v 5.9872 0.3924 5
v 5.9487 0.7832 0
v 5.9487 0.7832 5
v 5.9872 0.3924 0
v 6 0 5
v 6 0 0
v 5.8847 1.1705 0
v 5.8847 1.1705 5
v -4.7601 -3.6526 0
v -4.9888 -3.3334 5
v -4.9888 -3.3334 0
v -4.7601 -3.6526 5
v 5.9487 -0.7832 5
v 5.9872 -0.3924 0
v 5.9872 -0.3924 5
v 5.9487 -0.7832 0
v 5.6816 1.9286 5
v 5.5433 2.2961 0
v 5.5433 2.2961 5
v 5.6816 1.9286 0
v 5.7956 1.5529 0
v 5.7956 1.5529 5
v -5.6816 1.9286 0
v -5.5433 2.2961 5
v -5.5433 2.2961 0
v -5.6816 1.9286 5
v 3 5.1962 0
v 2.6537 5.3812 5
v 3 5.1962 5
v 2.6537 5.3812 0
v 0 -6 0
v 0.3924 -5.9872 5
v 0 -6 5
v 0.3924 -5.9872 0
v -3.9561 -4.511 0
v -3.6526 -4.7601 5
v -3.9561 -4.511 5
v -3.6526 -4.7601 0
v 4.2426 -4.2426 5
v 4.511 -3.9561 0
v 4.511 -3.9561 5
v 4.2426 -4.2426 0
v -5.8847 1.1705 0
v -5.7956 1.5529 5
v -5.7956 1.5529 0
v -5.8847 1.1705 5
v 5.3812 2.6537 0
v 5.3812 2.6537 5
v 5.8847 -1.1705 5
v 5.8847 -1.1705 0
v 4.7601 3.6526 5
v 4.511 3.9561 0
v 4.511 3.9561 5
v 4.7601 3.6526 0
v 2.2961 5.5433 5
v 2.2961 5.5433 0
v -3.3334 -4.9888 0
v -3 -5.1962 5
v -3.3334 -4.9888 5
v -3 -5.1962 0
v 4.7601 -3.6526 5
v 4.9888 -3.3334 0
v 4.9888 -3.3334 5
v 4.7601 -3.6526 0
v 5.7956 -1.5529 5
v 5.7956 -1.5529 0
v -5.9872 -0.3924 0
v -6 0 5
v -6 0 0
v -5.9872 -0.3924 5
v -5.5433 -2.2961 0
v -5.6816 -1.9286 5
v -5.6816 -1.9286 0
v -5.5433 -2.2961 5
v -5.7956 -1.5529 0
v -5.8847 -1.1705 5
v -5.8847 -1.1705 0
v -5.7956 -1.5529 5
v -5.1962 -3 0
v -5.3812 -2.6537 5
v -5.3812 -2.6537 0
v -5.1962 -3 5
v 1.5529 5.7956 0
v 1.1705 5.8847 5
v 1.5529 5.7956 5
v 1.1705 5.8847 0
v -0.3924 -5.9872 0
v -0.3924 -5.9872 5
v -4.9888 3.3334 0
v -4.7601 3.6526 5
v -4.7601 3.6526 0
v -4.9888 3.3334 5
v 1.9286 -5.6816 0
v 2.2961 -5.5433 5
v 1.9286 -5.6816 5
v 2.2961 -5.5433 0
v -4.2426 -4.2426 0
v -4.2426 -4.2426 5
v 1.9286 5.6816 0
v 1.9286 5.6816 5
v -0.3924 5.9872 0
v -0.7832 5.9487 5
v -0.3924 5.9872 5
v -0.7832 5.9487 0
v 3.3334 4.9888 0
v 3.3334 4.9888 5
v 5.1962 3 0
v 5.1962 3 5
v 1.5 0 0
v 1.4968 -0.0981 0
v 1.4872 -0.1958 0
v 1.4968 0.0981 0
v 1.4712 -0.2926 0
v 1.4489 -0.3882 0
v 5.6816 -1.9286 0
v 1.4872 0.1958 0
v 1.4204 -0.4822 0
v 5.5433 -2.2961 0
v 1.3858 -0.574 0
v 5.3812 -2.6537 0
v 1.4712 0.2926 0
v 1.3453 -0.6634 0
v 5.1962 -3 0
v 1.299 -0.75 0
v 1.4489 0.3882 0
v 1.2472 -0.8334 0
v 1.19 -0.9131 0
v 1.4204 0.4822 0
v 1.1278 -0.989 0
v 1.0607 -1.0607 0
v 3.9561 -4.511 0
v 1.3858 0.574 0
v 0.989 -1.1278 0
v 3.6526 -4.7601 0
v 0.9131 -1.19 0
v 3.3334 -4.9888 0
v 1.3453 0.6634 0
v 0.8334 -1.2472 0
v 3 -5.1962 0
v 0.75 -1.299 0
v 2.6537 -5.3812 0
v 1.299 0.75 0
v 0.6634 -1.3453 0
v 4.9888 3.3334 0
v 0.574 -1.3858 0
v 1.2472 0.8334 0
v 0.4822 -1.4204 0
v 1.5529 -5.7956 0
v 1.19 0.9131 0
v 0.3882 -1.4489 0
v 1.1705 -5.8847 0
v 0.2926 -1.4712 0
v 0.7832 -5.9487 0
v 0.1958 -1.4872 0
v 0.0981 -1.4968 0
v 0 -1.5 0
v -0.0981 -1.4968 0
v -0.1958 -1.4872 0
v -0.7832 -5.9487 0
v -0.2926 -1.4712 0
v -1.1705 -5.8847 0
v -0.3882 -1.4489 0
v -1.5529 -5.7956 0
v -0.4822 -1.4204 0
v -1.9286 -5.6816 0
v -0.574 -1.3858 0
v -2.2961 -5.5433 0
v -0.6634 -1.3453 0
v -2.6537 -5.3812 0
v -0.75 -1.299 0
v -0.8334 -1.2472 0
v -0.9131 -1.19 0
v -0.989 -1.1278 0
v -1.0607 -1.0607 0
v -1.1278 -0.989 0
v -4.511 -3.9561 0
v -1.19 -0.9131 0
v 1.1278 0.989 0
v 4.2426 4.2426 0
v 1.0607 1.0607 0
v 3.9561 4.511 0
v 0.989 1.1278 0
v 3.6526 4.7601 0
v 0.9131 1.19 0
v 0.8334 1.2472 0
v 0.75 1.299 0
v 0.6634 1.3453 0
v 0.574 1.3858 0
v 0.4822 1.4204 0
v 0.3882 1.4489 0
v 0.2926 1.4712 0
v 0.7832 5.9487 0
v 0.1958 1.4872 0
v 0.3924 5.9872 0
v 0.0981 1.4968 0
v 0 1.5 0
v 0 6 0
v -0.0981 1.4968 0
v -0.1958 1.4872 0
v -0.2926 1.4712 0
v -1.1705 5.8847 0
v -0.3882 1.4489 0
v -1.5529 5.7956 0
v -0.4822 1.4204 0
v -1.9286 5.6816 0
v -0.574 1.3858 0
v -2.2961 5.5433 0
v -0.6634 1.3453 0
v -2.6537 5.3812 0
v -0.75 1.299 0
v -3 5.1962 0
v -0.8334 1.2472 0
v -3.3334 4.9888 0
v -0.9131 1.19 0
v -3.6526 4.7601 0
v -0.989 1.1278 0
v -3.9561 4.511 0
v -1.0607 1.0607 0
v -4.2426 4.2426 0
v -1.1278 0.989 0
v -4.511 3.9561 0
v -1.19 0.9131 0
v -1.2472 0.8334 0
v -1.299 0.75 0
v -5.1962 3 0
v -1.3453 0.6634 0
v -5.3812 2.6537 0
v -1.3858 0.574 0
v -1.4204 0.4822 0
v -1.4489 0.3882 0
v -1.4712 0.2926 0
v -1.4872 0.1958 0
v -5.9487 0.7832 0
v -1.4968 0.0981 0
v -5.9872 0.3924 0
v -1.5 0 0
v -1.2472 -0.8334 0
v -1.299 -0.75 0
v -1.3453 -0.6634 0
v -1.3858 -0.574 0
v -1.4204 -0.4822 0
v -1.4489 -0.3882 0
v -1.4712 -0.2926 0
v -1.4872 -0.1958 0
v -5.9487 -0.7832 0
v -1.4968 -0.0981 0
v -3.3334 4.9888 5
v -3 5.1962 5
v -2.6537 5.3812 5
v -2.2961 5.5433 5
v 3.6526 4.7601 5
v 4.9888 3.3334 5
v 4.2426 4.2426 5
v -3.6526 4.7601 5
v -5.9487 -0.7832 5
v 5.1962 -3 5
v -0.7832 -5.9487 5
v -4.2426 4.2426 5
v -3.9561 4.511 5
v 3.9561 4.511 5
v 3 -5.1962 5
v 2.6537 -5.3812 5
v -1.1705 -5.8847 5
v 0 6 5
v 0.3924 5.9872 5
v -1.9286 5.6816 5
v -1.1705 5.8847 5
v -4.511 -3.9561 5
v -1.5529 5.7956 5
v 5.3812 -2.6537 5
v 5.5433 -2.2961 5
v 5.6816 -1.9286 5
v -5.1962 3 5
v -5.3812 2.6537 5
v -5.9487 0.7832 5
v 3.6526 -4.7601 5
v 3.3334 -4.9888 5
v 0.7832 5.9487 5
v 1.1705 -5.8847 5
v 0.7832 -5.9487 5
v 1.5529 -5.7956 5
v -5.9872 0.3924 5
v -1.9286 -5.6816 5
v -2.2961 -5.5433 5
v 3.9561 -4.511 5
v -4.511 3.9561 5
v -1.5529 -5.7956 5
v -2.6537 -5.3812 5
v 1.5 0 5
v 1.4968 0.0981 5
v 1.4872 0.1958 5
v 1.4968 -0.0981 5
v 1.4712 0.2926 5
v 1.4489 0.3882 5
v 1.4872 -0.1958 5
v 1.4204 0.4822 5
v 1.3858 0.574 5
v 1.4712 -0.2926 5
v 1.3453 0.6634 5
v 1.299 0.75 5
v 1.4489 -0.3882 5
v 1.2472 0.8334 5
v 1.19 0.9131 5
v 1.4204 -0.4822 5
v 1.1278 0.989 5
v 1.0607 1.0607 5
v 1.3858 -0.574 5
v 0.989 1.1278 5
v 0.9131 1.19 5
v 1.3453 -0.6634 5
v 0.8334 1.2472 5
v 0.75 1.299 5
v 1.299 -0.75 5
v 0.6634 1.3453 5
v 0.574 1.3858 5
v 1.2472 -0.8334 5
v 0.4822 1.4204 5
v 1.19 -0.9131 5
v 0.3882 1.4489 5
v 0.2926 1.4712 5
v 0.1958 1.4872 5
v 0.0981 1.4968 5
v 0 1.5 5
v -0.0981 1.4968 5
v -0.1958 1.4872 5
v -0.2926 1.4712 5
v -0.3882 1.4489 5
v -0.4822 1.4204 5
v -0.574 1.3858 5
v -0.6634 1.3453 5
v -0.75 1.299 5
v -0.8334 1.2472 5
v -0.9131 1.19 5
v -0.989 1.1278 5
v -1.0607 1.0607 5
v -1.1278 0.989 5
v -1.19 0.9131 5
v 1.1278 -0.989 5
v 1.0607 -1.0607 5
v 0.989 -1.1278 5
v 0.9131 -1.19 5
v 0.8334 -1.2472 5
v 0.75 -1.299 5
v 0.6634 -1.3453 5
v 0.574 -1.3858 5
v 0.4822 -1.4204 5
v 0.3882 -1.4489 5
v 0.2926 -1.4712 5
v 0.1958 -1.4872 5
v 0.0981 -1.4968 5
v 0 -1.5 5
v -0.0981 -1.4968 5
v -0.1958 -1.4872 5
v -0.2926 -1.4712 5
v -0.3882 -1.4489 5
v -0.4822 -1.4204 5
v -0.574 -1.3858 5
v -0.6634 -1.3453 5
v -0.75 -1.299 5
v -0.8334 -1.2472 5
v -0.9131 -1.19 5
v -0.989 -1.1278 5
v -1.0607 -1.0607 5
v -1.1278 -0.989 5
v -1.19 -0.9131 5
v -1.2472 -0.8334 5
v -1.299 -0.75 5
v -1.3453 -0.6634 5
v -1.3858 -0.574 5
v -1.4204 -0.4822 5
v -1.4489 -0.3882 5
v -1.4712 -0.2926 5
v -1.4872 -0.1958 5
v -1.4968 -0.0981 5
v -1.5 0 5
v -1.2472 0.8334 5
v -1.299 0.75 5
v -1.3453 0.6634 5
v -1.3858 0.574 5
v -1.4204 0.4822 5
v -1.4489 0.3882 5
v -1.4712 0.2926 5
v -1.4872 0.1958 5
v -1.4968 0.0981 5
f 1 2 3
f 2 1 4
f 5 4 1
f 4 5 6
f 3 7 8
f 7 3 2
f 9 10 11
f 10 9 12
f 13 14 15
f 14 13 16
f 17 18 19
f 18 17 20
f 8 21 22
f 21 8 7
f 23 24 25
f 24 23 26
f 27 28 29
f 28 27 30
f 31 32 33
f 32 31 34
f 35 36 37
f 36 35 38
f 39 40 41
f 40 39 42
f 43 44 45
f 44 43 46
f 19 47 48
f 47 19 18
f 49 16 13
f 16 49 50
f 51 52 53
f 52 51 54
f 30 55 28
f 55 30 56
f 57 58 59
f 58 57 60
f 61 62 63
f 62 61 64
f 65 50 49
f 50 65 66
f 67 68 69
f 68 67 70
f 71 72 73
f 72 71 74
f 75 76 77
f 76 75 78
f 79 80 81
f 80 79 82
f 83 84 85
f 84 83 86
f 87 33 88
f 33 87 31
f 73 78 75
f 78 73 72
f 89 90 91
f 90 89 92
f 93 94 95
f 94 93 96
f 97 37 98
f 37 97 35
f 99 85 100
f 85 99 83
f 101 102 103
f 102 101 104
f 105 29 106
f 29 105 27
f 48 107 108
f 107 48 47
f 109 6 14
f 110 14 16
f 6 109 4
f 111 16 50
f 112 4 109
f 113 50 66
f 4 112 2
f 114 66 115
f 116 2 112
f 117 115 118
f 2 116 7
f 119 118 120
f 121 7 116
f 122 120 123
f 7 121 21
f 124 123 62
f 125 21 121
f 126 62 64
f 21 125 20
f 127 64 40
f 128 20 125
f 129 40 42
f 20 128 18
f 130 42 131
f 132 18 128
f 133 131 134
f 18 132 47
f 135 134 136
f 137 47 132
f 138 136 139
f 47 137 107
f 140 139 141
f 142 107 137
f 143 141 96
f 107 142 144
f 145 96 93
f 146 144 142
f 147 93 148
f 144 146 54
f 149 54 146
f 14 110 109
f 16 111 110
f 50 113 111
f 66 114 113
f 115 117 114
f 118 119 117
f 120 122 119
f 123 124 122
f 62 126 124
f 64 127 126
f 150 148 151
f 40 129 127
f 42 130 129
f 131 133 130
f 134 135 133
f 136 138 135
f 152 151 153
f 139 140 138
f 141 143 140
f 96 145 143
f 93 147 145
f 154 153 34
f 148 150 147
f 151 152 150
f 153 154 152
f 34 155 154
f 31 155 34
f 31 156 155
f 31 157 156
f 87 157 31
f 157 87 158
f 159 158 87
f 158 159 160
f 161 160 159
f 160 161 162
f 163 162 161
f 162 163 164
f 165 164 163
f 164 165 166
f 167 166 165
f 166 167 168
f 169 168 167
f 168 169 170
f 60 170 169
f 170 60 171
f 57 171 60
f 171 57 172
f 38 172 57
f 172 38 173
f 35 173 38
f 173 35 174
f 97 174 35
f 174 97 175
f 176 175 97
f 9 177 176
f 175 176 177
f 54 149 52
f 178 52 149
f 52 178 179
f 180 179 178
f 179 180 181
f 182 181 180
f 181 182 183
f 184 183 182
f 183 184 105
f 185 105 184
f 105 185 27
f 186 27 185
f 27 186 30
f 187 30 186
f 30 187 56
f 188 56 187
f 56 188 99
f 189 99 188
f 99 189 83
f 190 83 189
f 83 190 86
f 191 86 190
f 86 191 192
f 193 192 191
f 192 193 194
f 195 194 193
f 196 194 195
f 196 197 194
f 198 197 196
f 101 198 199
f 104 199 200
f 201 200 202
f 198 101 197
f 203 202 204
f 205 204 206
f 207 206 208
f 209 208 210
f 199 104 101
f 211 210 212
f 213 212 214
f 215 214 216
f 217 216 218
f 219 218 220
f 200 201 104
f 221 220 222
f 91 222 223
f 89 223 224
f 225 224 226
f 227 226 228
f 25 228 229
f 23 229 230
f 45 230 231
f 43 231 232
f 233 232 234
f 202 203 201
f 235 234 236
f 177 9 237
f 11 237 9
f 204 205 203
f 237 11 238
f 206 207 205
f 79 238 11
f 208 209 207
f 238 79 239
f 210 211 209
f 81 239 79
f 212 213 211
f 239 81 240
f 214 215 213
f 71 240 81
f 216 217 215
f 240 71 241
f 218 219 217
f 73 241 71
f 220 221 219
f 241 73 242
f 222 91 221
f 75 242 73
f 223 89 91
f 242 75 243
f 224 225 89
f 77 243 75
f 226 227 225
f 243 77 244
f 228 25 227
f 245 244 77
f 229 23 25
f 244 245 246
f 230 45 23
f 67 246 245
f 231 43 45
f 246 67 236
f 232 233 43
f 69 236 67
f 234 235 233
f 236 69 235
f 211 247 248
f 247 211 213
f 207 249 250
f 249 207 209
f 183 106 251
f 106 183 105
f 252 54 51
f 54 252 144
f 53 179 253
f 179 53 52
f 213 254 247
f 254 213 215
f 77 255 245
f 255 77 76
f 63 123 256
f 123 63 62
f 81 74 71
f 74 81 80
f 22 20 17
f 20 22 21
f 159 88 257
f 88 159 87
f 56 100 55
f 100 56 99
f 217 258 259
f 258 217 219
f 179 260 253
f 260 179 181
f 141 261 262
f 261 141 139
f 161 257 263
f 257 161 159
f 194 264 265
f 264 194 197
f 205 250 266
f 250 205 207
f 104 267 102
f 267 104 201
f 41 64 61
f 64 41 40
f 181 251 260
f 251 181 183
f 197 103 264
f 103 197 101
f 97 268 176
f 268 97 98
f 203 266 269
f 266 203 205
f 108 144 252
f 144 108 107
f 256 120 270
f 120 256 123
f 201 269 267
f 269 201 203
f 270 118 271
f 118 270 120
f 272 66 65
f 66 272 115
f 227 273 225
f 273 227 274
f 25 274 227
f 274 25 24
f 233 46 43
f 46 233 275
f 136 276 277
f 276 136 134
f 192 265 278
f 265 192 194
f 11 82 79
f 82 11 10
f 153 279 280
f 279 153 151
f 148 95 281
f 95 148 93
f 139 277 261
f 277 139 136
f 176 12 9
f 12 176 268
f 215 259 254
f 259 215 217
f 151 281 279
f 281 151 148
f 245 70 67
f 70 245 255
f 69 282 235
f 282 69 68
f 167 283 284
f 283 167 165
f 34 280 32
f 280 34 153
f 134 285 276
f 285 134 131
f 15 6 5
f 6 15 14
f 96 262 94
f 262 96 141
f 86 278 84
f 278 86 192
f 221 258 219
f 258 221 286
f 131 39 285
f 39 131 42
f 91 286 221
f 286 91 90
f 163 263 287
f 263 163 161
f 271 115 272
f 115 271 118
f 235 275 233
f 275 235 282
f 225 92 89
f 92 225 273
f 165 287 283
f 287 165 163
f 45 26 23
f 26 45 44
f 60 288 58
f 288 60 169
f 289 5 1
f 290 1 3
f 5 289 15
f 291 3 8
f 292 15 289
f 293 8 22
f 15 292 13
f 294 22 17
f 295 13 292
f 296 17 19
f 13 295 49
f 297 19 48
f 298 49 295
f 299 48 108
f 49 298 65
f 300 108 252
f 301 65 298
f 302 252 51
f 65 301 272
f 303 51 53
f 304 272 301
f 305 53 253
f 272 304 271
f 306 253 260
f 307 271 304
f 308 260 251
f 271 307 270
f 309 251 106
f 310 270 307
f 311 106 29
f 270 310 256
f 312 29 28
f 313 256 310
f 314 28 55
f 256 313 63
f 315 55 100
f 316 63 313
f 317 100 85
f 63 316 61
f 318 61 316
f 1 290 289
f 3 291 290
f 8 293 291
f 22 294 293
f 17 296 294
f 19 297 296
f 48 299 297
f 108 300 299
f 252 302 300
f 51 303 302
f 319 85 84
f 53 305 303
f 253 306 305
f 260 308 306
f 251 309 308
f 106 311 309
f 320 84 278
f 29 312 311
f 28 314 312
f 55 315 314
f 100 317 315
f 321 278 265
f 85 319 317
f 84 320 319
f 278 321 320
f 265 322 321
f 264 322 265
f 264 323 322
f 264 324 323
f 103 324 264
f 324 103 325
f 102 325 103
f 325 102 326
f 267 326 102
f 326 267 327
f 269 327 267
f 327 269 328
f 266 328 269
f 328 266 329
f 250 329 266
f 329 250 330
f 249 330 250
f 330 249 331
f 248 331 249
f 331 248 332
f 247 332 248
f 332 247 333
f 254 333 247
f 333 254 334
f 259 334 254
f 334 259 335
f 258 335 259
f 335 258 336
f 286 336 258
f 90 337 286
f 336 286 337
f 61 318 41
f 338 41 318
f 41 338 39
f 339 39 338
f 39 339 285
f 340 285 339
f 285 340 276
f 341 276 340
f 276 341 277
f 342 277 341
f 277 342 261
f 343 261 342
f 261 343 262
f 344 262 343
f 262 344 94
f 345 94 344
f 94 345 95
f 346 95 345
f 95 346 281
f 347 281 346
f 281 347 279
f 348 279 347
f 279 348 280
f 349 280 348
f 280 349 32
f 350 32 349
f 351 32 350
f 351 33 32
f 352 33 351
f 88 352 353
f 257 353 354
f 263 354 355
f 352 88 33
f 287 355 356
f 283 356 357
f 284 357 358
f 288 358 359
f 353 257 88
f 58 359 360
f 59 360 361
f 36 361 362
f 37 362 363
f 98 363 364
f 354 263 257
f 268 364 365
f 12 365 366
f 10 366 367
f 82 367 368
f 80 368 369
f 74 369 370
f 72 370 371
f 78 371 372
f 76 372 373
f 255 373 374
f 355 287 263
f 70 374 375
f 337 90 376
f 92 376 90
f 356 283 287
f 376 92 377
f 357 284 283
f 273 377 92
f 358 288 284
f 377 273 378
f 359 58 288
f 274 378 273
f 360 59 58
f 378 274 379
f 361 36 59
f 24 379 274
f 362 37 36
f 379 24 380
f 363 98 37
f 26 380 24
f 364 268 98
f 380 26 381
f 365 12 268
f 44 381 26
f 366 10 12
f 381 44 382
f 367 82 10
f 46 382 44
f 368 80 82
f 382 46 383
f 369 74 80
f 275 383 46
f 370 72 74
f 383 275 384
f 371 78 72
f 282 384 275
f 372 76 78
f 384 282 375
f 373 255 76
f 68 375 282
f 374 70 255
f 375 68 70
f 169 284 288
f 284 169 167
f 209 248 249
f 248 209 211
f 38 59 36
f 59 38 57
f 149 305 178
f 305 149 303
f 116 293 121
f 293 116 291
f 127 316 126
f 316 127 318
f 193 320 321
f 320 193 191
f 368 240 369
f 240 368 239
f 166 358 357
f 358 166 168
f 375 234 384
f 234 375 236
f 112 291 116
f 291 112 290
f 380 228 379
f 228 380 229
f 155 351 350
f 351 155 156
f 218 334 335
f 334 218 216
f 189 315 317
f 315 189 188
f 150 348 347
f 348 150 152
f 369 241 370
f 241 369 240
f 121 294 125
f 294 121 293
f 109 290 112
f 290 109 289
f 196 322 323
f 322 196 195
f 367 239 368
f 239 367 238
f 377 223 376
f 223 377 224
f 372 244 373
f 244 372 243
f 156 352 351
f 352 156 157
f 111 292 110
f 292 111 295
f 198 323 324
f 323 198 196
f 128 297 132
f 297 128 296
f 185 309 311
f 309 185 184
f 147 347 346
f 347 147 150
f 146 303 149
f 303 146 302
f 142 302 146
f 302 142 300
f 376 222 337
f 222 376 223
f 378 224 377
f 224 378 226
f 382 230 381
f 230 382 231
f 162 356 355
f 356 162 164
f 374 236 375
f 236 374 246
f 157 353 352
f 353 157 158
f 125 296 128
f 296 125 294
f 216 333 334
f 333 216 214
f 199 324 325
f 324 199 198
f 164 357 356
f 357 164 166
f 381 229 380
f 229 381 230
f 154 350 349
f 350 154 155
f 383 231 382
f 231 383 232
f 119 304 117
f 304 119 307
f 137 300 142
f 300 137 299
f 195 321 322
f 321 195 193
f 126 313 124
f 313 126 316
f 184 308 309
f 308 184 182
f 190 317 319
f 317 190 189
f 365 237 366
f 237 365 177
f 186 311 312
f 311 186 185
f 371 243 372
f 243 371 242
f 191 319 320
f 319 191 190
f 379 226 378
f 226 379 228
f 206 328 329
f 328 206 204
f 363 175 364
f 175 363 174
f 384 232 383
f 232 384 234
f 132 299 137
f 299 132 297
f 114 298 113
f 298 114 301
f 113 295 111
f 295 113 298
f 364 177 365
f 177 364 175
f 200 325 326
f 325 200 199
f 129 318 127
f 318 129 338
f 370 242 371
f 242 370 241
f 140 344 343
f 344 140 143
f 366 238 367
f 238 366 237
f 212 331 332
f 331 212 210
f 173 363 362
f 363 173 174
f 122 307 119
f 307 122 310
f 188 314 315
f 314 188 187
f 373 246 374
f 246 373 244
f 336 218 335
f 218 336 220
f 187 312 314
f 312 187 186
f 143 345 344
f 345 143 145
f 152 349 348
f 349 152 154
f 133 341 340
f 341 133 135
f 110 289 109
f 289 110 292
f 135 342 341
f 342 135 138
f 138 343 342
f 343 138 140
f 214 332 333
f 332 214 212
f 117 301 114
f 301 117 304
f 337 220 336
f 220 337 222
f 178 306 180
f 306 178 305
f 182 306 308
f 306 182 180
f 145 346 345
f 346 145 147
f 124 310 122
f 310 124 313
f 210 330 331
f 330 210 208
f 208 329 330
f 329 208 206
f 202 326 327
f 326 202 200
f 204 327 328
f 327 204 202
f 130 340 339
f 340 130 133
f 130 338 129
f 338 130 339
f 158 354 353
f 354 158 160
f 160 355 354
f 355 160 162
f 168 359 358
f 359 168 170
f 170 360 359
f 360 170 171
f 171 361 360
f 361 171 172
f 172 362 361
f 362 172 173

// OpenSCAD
// Hose-barb reducer: joins 8 mm inner-diameter silicone tubing to 5 mm inner-diameter tubing
// Print orientation: standing upright along +Z, centred on origin in X/Y
// Units: mm

// ---------------- Parameters ----------------
reducer_d      = 12;   // collar outer diameter (z = 20..25)
bore_d         = 3;    // through-bore diameter
eps            = 0.5;  // overcut for clean differences

// 8 mm tubing side (z = 0..20)
t1_h           = 10;   // barb height
t1_d_bottom    = 7.5;  // barb outer diameter at bottom
t1_d_top       = 9.5;  // barb outer diameter at top
t1_n           = 2;    // number of stacked barbs

// 5 mm tubing side (z = 25..41)
t2_h           = 8;    // barb height
t2_d_bottom    = 6.5;  // barb outer diameter at bottom
t2_d_top       = 5.0;  // barb outer diameter at top
t2_n           = 2;    // number of stacked barbs

// Derived
z_collar_low   = 20;   // collar start
z_collar_high  = 25;   // collar end
z_t2_start     = z_collar_high + eps;  // 5 mm barbs start after collar
z_t2_end       = z_t2_start + t2_h * t2_n;  // 41 mm overall top

$fn = 96;

// ---------------- Model ----------------
difference() {
    union() {
        // 8 mm tubing barbs: sawtooth profile, centred on axis
        for (i = [0 : t1_n - 1]) {
            translate([0, 0, i * t1_h])
                linear_extrude(height = t1_h)
                    polygon([
                        [0, -t1_d_bottom / 2],
                        [0, t1_d_bottom / 2],
                        [(i + 1) * t1_h, -t1_d_top / 2],
                        [(i + 1) * t1_h, t1_d_top / 2]
                    ]);
        }

        // Collar
        cylinder(d = reducer_d, h = z_collar_high - z_collar_low);

        // 5 mm tubing barbs: shrinking profile, centred on axis
        for (i = [0 : t2_n - 1]) {
            translate([0, 0, z_t2_start + i * t2_h])
                linear_extrude(height = t2_h)
                    polygon([
                        [0, -t2_d_bottom / 2],
                        [0, t2_d_bottom / 2],
                        [t2_h, -t2_d_top / 2],
                        [t2_h, t2_d_top / 2]
                    ]);
        }
    }

    // Through-bore
    translate([0, 0, -eps])
        cylinder(d = bore_d, h = z_t2_end + 2 * eps);
}
